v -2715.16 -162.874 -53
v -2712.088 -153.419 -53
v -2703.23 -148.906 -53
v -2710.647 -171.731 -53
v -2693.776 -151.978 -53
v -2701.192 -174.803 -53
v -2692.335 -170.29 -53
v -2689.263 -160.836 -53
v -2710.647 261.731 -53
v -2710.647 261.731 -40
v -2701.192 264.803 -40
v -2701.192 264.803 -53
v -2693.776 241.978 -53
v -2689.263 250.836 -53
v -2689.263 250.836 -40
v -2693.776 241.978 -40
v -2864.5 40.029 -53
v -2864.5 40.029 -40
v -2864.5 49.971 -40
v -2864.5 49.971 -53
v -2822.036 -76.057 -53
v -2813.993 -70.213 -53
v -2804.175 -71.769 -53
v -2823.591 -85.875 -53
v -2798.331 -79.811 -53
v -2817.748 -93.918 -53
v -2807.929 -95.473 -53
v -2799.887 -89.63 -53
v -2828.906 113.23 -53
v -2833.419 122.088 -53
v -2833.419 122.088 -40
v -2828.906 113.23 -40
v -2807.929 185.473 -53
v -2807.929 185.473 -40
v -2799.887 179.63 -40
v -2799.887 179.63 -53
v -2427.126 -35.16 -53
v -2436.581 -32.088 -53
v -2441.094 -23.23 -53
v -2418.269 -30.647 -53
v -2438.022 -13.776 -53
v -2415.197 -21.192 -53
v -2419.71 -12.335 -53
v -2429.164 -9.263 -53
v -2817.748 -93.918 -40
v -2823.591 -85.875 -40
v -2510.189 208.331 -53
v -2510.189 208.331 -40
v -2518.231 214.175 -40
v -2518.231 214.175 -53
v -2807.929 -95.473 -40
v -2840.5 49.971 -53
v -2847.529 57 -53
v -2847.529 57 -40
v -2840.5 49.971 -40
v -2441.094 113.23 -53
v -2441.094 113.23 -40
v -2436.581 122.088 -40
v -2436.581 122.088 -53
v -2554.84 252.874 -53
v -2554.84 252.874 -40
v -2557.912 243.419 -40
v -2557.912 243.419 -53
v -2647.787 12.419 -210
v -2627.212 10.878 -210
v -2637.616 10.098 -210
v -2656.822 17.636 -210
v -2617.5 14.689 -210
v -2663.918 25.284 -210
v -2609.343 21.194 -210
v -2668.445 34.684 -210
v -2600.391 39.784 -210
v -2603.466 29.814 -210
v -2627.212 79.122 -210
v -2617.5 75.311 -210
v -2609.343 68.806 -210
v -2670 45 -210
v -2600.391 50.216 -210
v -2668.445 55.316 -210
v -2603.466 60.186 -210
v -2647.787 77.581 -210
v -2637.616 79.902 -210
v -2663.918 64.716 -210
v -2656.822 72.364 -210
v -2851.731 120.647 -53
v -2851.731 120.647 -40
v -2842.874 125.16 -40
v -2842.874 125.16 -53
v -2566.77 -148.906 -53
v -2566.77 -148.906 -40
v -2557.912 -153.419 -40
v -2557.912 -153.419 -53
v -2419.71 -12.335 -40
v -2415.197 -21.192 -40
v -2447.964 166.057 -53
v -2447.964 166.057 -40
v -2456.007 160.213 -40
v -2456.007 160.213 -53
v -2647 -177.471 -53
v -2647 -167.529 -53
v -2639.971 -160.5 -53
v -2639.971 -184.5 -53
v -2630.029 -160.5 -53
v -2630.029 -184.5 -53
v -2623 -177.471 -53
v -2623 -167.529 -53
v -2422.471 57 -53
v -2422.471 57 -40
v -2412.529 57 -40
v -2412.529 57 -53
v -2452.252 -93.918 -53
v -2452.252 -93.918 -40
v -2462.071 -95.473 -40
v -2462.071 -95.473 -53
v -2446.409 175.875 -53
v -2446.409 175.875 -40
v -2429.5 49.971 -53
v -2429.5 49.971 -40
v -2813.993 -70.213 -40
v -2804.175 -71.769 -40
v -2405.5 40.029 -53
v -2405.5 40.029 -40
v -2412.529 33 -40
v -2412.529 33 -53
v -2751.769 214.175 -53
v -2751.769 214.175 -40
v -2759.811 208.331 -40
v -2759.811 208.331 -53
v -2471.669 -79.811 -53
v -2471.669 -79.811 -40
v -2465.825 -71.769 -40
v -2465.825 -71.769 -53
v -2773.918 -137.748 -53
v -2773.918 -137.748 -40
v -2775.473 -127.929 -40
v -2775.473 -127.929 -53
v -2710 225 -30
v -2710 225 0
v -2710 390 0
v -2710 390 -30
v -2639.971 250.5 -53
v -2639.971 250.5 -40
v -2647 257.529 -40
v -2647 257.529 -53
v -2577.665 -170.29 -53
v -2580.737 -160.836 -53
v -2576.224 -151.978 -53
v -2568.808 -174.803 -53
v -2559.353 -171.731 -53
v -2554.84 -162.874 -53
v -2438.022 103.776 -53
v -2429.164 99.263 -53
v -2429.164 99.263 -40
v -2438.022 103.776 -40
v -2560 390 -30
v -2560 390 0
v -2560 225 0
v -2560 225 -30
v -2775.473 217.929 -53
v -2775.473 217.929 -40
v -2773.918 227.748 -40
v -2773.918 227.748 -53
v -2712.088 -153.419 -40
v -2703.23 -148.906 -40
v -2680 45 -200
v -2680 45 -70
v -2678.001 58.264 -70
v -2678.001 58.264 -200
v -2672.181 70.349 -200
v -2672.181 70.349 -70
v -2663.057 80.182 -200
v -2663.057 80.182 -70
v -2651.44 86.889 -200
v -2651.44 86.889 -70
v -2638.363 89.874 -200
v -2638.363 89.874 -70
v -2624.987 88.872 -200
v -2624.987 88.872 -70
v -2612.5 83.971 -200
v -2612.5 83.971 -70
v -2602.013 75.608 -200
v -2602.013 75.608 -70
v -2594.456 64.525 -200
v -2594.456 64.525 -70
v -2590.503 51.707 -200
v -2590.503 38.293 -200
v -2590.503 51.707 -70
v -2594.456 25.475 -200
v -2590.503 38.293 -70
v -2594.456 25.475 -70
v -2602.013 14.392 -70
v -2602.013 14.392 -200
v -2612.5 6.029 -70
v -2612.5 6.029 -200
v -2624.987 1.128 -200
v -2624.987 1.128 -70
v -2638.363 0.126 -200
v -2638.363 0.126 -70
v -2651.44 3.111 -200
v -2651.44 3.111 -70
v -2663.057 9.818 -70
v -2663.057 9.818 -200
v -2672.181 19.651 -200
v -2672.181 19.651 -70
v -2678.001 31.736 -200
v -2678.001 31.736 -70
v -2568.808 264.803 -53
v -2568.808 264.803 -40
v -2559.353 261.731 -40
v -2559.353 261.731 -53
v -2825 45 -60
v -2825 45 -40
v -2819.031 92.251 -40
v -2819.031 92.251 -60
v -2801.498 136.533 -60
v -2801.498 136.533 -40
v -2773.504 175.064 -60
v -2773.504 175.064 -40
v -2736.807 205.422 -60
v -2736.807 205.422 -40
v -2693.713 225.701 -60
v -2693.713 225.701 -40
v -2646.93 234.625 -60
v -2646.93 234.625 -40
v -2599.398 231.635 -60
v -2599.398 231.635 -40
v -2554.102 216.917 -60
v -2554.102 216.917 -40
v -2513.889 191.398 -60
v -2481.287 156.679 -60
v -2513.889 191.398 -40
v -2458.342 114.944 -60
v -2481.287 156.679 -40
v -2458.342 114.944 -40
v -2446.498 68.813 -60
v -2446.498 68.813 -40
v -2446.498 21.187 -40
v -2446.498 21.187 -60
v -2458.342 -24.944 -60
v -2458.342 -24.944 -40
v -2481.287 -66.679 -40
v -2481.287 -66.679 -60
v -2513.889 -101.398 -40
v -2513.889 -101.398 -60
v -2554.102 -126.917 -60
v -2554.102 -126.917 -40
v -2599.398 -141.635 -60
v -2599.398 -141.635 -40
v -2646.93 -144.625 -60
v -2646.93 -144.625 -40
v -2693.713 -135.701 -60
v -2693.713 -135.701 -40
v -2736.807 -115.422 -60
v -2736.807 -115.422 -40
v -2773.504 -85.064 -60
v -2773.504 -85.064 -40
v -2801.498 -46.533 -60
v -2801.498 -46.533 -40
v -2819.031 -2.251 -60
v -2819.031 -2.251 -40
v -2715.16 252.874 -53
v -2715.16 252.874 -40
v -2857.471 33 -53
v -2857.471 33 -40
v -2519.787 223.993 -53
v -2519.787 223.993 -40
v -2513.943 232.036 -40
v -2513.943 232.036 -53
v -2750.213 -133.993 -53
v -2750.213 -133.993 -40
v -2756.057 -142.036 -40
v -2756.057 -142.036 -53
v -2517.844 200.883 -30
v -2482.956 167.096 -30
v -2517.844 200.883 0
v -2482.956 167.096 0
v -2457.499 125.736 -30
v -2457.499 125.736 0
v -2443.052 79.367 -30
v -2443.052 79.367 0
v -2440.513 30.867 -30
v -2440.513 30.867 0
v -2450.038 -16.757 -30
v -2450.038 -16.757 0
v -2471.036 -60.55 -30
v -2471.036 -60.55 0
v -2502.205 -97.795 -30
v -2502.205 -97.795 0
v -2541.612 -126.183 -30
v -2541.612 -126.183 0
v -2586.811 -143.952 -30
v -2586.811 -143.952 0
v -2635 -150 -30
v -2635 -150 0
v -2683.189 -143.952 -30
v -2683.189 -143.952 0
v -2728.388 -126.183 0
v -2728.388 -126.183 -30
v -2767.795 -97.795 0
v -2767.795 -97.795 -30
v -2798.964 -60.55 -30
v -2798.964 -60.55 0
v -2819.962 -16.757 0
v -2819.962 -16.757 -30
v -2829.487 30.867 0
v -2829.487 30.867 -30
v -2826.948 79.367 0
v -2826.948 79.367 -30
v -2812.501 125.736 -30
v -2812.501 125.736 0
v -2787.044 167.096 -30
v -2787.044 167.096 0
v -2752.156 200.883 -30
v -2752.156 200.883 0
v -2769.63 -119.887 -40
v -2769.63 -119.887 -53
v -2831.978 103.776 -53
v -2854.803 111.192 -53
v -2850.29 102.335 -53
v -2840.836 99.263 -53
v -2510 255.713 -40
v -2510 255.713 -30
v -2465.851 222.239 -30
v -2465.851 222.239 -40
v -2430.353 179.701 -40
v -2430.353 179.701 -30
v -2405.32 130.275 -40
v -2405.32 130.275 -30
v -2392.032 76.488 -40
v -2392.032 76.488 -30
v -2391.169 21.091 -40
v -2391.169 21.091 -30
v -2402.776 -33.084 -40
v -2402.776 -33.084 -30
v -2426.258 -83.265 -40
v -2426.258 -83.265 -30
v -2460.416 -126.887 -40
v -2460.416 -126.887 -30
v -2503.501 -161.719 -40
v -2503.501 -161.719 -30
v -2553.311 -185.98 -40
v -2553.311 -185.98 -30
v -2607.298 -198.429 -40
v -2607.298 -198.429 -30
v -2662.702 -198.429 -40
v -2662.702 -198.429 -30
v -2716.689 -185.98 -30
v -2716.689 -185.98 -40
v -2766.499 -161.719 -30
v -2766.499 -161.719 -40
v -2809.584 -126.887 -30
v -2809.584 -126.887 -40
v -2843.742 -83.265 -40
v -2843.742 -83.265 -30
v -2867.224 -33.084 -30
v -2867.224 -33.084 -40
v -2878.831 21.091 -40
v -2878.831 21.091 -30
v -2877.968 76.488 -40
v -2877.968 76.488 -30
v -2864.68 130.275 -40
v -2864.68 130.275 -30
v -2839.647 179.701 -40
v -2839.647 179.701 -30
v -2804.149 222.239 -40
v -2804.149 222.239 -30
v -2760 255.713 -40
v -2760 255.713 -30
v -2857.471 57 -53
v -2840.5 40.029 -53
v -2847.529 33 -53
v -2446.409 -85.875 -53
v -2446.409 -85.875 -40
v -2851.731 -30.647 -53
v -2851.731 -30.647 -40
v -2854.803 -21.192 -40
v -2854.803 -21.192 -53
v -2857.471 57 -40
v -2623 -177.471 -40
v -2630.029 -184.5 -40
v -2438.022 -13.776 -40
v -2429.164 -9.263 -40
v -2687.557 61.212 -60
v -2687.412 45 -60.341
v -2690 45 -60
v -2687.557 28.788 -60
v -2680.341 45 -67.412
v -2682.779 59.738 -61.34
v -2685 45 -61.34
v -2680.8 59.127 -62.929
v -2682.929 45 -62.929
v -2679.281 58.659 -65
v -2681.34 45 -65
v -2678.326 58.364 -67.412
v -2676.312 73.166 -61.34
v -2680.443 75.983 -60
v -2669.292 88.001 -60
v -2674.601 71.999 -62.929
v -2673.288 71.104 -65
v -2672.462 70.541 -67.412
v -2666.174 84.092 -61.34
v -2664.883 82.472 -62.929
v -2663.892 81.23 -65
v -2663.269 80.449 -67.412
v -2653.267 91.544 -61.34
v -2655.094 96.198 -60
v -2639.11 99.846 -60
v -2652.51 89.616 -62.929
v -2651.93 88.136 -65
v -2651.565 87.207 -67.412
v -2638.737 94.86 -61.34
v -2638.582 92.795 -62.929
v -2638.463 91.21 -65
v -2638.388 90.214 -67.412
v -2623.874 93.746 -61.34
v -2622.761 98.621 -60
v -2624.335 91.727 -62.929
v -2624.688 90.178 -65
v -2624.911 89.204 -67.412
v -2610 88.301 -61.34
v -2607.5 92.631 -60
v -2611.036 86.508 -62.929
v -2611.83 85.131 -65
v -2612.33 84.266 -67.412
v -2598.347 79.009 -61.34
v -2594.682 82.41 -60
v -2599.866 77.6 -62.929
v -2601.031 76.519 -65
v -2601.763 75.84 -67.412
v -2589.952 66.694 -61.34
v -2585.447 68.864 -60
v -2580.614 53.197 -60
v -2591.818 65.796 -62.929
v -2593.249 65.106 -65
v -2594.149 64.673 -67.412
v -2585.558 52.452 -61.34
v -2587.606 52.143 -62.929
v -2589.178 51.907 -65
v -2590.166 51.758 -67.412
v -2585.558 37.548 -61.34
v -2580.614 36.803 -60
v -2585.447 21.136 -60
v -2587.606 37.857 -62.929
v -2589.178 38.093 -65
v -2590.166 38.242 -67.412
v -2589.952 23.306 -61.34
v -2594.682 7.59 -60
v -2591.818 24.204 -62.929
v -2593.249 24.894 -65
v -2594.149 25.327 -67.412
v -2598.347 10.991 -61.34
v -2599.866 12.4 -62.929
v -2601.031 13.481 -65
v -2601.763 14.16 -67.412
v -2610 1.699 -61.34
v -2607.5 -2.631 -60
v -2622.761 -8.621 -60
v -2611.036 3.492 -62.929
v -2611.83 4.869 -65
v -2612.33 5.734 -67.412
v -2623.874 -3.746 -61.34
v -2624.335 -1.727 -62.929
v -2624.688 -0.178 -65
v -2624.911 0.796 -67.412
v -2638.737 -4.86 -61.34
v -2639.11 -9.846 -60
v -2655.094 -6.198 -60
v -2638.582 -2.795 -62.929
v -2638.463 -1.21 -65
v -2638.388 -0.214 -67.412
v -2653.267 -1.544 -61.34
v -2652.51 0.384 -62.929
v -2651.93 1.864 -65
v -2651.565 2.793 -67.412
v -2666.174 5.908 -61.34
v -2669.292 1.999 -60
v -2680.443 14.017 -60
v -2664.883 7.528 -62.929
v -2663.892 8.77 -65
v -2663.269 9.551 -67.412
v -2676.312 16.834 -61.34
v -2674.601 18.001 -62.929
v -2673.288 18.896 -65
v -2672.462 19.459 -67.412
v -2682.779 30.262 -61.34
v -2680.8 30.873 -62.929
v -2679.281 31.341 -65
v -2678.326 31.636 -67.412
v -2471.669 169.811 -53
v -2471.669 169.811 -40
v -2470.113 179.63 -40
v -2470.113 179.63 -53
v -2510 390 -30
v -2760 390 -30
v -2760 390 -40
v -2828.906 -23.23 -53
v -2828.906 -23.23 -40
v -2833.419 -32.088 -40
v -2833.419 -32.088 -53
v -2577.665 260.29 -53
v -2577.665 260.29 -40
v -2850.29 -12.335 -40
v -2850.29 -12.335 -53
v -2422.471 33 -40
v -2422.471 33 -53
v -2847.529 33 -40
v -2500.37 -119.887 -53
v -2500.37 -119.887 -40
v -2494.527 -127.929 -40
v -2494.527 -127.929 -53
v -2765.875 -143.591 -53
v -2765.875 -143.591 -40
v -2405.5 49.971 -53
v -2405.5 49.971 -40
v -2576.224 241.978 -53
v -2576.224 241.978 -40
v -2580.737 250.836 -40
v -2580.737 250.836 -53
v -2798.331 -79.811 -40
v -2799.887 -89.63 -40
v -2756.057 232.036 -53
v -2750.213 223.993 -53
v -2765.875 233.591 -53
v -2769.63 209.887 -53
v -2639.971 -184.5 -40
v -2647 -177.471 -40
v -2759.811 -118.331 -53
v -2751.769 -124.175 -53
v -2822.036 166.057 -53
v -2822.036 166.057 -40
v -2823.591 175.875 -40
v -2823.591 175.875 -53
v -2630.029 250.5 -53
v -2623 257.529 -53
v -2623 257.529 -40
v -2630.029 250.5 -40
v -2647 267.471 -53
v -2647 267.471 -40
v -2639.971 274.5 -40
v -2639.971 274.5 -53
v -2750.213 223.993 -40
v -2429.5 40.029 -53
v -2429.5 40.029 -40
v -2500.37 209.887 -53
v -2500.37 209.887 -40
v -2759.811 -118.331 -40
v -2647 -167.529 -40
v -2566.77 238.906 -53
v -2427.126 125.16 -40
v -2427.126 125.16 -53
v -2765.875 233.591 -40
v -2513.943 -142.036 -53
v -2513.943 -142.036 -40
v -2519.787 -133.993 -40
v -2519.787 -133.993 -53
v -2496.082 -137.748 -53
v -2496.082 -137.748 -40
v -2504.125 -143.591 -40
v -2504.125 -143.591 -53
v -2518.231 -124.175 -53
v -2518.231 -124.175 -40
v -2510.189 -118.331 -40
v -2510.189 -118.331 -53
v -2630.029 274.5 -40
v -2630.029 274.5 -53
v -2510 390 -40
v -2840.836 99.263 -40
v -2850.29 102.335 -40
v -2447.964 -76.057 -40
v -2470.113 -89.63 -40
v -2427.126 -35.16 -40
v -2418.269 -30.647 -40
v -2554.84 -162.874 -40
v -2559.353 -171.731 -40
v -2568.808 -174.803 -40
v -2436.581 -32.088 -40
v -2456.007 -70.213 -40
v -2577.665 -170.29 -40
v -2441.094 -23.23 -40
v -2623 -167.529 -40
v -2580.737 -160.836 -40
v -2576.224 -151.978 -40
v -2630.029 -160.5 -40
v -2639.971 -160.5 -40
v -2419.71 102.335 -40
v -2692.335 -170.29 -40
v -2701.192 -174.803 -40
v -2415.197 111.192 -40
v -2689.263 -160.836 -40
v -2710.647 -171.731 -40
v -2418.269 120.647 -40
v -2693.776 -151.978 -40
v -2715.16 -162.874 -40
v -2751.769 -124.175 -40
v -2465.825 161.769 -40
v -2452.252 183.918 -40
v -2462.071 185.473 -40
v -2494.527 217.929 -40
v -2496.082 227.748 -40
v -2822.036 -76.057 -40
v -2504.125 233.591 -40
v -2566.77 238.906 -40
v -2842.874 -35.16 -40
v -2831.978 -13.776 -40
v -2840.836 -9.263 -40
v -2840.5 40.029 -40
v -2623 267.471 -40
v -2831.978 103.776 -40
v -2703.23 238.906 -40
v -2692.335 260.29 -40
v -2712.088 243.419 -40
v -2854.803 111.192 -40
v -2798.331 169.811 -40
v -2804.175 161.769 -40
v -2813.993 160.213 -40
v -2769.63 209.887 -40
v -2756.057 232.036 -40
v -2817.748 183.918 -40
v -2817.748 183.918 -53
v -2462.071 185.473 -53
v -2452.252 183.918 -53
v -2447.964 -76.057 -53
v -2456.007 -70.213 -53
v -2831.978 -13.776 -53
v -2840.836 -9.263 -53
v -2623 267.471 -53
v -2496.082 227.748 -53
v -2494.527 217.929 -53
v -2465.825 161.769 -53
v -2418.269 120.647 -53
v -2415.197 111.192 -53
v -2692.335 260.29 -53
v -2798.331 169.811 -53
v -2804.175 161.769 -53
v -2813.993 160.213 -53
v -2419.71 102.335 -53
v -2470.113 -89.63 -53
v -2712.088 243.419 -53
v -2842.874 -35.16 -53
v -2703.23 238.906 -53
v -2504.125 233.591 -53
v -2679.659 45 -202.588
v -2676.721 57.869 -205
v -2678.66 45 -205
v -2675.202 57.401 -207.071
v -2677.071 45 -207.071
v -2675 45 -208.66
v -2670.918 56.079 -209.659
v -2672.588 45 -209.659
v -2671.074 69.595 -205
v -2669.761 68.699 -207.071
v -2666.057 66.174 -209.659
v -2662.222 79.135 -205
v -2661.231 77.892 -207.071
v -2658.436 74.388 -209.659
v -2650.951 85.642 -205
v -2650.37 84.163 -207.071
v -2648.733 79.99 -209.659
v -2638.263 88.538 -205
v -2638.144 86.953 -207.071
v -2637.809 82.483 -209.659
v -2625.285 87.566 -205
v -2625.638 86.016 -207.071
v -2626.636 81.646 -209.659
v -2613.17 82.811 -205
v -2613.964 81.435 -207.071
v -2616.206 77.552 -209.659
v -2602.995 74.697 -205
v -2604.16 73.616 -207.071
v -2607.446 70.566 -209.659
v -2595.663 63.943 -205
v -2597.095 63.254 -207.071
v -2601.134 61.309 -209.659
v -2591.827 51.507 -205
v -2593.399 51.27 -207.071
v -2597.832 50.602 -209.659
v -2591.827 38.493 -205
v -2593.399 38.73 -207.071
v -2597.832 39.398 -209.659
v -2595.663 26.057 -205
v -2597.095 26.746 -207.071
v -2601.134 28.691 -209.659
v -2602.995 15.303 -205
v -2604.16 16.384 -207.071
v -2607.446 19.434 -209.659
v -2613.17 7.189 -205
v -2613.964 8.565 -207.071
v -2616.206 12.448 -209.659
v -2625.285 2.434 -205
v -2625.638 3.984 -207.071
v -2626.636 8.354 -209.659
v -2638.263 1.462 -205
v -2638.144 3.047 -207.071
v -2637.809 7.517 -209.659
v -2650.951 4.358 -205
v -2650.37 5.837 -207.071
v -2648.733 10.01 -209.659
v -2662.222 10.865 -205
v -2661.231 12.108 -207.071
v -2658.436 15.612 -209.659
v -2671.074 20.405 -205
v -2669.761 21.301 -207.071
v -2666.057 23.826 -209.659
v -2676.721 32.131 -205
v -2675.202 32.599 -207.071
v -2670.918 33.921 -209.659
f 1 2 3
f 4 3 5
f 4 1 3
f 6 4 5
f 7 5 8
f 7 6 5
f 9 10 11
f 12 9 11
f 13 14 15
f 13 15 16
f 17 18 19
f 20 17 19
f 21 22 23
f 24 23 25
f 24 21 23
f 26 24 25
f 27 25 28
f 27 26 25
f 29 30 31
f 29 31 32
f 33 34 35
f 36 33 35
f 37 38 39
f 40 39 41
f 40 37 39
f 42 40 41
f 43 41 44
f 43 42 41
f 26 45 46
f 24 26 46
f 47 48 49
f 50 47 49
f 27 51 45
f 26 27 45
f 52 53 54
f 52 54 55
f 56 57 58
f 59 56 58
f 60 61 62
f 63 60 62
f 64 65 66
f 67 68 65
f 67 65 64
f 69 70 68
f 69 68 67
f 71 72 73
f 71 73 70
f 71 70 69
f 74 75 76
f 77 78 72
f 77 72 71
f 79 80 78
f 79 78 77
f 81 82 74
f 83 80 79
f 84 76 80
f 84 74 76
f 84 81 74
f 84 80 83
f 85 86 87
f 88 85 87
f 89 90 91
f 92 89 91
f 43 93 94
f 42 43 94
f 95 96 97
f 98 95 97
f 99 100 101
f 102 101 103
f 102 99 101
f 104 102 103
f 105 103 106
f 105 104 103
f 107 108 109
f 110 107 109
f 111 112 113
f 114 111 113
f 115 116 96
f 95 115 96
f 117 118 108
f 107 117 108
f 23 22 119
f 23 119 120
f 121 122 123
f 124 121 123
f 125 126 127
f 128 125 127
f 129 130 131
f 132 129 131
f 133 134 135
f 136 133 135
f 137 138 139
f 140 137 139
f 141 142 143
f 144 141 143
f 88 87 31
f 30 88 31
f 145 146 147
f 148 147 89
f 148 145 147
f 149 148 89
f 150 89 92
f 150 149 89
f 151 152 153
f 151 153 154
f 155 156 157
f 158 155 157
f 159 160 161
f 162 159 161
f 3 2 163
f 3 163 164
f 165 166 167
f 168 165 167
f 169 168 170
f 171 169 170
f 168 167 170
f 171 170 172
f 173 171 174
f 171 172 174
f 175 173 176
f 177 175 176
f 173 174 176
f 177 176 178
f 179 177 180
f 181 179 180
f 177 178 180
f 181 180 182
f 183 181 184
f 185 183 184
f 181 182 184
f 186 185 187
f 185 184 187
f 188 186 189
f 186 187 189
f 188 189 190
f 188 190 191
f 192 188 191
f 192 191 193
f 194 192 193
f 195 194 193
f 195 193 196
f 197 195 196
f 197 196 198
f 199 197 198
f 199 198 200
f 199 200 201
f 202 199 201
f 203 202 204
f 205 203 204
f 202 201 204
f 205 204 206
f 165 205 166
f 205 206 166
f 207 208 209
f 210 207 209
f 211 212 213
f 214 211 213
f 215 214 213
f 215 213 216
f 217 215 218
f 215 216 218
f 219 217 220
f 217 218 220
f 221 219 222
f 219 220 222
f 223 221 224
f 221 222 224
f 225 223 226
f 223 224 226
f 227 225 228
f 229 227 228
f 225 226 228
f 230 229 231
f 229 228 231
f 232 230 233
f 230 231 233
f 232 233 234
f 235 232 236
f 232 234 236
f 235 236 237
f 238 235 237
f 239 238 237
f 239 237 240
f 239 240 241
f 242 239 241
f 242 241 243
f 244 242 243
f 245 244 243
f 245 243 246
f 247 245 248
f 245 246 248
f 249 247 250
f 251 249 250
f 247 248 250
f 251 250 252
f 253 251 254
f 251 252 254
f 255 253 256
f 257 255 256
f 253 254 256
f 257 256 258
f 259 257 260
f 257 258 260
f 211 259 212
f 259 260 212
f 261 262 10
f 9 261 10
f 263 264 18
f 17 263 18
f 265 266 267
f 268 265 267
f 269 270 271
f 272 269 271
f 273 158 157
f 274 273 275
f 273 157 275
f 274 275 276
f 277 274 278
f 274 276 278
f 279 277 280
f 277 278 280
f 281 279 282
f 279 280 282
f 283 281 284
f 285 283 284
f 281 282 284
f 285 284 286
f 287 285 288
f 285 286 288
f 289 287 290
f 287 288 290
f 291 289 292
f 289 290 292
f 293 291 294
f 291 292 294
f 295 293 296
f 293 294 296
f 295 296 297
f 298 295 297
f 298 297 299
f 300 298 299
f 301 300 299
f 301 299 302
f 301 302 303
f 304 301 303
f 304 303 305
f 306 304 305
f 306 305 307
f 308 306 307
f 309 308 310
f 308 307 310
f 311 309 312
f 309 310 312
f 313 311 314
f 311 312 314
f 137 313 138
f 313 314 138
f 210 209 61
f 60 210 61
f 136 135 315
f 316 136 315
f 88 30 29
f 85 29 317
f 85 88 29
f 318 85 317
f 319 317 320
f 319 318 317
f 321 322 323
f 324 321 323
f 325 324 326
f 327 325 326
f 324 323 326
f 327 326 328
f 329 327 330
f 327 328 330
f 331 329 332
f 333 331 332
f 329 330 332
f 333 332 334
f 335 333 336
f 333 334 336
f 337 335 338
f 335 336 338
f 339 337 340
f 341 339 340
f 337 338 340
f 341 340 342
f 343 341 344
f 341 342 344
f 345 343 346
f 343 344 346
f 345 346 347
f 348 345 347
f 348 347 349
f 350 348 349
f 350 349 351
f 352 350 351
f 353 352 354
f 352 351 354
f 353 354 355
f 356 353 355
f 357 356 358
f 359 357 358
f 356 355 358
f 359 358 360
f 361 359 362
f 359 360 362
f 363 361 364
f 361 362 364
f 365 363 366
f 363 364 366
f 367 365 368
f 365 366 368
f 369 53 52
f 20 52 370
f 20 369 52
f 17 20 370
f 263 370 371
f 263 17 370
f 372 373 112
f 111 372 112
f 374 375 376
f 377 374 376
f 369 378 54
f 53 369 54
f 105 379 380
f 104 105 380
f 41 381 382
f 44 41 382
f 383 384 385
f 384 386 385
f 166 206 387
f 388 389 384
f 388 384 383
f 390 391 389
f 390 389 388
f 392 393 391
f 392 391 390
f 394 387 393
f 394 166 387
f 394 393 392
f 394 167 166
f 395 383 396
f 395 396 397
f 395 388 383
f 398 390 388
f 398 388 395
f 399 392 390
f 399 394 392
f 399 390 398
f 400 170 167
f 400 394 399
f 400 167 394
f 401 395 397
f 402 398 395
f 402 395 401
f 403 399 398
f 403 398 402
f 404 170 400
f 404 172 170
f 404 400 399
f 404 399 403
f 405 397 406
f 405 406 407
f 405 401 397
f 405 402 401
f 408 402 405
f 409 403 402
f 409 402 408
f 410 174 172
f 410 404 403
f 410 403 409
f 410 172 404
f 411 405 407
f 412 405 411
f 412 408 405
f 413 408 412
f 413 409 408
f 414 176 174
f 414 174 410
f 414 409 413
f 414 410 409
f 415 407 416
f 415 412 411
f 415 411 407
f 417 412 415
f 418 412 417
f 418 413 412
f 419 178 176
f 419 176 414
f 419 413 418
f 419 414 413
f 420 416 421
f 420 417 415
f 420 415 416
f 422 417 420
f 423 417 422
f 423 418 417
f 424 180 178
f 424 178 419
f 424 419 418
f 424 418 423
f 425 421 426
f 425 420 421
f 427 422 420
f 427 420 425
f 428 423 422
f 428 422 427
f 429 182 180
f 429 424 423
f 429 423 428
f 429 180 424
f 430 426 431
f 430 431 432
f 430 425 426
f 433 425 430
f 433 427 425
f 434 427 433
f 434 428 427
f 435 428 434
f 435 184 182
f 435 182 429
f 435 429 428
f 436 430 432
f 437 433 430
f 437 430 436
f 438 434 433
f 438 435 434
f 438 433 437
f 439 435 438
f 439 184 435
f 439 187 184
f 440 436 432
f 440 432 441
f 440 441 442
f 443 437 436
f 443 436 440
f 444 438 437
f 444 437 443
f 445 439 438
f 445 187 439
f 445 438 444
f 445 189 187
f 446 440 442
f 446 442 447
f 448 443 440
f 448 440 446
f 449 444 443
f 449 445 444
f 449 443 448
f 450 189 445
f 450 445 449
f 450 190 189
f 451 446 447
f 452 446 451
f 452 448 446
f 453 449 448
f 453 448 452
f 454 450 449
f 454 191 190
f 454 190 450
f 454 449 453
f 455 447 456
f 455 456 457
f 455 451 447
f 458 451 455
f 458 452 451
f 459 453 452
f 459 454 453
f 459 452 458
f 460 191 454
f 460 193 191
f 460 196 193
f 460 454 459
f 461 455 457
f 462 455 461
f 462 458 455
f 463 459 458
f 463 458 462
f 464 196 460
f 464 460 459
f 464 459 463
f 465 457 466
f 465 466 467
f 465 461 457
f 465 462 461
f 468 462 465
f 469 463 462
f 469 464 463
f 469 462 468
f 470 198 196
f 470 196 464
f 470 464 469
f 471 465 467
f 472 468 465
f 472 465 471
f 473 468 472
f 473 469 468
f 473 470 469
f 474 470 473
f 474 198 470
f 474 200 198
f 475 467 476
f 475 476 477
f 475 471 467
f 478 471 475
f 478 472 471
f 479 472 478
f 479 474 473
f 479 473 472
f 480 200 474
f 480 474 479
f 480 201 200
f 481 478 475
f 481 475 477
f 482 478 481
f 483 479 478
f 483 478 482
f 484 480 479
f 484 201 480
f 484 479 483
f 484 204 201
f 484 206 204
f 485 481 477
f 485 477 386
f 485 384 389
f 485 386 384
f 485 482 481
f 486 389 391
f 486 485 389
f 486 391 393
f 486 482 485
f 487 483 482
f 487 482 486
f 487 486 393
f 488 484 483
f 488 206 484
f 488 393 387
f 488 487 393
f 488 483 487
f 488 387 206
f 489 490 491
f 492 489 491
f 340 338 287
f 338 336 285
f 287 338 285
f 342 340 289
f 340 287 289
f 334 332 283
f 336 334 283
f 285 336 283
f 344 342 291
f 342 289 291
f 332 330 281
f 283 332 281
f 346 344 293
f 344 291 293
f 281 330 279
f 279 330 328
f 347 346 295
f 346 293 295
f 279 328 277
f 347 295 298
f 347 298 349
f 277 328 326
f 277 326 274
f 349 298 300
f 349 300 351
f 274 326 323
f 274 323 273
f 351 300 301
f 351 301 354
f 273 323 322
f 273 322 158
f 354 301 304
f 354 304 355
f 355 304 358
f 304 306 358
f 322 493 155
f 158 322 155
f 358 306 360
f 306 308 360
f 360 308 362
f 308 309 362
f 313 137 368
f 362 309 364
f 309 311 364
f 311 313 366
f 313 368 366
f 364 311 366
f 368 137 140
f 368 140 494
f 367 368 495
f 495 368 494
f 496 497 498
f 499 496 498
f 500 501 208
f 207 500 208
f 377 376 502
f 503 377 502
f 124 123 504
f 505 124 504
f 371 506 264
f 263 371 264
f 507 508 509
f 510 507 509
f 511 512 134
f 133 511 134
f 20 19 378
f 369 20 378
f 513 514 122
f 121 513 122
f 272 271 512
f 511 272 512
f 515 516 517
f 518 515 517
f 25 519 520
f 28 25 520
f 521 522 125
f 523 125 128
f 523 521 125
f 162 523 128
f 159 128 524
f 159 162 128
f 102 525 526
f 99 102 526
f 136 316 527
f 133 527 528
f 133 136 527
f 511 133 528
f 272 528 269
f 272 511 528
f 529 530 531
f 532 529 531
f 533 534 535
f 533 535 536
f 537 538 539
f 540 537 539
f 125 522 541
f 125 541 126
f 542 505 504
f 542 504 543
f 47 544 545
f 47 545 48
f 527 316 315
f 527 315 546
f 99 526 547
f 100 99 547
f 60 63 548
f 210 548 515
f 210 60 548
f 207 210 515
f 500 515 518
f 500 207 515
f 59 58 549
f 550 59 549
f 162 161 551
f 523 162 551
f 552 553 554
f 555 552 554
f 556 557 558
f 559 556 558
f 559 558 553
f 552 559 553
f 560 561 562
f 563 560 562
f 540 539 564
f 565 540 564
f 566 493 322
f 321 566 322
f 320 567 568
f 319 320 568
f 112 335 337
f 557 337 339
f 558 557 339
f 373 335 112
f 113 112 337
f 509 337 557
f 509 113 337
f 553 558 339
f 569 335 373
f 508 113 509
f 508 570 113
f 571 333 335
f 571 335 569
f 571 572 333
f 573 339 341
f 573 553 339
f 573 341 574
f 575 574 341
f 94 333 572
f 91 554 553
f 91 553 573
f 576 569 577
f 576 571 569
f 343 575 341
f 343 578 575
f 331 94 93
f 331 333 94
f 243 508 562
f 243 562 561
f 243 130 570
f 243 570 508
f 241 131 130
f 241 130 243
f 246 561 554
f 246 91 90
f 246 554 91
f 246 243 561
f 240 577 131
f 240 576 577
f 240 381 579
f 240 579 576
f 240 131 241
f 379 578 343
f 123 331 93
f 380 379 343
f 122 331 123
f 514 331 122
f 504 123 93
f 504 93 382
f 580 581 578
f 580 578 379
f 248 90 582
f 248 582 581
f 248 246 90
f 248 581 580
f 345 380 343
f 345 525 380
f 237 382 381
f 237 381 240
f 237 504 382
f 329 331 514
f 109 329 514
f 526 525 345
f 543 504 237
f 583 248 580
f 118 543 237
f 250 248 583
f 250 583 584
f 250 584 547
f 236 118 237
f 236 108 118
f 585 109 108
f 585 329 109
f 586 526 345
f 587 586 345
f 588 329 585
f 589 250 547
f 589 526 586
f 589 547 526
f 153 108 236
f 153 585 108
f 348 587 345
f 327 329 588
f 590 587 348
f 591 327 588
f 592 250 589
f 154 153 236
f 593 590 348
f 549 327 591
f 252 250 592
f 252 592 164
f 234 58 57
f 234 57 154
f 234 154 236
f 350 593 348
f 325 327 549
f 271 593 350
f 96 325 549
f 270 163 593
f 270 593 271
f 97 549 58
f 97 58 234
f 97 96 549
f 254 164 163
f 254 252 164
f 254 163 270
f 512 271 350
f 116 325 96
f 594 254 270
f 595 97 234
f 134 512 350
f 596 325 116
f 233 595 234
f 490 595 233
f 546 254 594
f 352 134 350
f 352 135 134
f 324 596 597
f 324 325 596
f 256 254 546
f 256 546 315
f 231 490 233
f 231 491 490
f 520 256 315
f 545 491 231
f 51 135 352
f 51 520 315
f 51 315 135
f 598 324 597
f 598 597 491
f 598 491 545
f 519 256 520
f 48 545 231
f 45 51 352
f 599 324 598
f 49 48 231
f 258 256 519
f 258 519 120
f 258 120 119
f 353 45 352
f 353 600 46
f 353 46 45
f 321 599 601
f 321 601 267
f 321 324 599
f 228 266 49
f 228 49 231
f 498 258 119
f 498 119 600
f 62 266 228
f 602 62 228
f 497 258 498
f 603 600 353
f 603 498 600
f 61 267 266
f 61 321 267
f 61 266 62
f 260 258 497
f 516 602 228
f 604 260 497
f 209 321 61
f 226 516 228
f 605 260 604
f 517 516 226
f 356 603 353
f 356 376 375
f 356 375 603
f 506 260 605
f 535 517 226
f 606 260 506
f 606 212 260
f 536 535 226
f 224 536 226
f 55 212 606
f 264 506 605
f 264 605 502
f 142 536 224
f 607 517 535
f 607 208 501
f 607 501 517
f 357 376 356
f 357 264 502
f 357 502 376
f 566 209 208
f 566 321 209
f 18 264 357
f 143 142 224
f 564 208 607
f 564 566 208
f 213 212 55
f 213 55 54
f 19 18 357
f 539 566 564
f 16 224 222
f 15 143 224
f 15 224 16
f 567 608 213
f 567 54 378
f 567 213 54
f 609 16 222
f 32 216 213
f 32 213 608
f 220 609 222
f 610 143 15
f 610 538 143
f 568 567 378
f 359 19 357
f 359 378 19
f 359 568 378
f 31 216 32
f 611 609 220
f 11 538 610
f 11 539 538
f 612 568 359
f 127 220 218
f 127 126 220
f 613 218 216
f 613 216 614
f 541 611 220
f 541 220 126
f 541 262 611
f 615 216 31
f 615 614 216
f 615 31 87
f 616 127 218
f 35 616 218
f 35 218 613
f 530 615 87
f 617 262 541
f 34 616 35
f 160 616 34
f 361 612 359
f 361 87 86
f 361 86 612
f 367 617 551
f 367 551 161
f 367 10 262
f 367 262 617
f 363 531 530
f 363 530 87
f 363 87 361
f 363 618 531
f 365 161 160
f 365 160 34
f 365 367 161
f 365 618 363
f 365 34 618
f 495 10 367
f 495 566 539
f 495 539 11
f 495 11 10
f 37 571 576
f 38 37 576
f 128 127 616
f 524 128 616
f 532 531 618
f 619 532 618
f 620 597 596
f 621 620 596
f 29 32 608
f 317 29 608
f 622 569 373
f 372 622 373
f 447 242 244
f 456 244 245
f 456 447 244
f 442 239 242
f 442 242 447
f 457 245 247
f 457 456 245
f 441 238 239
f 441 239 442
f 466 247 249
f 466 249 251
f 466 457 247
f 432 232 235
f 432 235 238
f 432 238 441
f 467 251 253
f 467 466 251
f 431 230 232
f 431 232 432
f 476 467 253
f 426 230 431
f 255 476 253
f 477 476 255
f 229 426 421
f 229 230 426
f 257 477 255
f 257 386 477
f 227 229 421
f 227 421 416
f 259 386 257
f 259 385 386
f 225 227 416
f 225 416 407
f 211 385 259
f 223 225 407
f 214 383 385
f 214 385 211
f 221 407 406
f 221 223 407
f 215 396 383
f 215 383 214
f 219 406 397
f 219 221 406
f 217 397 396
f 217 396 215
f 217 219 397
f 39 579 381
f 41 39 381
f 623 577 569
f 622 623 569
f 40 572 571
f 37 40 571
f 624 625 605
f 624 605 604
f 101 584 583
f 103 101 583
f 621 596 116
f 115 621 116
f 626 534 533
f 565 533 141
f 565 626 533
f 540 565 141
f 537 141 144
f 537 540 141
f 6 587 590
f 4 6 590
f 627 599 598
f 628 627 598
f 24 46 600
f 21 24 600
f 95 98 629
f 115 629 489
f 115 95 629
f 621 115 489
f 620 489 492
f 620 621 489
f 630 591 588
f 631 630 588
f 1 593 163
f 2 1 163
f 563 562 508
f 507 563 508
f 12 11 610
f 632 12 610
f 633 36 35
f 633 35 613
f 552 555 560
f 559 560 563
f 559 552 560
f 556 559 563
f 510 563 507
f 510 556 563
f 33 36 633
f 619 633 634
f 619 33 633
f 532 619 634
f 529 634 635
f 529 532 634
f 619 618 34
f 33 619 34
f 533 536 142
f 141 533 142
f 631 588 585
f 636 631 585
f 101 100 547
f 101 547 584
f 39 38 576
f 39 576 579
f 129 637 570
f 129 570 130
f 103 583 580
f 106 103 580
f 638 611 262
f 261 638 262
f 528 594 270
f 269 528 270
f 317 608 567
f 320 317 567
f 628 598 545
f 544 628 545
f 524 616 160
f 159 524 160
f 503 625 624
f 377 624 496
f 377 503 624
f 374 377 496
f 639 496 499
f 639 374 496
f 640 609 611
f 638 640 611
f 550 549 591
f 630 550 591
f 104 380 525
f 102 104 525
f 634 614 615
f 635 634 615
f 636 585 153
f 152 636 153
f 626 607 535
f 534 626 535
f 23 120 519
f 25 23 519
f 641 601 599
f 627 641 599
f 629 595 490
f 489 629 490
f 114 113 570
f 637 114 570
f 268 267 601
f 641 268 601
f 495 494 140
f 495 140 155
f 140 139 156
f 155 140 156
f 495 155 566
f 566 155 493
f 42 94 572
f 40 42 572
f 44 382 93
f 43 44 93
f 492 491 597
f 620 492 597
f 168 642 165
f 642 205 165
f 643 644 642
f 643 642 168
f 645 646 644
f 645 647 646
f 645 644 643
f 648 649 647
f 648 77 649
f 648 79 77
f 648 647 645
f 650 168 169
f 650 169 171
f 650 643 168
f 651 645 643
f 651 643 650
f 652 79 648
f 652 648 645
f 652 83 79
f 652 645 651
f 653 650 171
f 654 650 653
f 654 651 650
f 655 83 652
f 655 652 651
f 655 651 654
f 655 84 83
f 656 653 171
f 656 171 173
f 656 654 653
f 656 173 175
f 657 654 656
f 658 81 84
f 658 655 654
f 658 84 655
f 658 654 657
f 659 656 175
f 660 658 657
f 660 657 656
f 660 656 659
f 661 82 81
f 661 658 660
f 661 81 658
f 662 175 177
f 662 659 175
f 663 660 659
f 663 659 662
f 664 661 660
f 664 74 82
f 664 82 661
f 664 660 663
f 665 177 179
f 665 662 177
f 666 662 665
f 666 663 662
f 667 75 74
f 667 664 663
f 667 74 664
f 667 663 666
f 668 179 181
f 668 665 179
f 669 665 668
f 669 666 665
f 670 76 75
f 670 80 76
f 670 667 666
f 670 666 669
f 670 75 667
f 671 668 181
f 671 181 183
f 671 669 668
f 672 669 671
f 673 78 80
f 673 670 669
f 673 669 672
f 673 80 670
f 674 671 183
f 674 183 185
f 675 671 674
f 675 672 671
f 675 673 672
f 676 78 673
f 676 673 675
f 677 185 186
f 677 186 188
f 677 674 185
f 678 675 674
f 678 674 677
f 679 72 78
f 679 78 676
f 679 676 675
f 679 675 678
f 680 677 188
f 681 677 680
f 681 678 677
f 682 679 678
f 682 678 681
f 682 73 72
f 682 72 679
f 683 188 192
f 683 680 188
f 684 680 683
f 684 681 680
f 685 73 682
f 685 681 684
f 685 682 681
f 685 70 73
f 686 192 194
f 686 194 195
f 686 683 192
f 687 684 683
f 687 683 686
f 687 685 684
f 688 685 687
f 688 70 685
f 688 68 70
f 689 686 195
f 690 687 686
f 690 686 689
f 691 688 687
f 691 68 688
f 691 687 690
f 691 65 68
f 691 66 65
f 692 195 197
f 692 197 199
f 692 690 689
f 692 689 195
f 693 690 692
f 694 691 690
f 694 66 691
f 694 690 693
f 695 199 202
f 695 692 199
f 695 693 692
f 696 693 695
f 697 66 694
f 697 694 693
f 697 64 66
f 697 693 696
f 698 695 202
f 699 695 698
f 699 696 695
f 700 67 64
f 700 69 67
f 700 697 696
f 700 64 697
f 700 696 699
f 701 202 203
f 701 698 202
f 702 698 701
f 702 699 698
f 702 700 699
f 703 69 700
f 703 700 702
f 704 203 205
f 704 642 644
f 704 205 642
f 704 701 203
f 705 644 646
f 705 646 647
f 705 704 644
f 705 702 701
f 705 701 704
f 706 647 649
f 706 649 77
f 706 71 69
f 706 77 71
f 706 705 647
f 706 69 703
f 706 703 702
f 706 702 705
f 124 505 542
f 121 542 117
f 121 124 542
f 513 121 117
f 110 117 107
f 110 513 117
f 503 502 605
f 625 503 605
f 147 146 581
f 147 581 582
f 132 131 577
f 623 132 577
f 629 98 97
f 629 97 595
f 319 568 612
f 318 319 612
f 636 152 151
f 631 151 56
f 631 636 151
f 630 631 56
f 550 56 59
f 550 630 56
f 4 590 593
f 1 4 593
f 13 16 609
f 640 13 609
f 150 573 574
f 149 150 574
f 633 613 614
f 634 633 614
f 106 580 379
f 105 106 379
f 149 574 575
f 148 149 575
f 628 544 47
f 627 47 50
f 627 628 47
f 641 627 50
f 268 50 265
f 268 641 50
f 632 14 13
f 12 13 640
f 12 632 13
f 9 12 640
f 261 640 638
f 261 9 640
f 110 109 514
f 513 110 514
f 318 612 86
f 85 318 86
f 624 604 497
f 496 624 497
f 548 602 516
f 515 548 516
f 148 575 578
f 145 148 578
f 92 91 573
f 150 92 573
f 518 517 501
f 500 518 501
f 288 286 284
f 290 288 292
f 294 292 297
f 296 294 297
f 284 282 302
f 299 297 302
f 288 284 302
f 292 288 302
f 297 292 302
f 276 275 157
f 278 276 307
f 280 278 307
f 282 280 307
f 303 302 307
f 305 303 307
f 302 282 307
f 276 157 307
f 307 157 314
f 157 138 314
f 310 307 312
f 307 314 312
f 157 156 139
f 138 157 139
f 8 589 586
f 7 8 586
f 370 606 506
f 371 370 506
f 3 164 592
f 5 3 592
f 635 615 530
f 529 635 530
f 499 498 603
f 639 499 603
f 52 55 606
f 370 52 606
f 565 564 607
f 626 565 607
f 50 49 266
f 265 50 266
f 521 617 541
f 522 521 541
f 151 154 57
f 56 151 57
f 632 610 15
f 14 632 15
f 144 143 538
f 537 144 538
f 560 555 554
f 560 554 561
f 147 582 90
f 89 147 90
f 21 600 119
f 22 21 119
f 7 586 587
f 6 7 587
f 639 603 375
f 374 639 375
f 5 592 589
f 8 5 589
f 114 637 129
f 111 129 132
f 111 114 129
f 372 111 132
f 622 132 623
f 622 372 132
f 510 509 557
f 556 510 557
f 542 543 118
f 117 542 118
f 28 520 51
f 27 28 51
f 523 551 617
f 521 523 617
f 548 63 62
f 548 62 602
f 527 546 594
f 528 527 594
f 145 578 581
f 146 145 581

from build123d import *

# Parameters (mm, degrees)
Y_KSEKLIK_EKSTR_ZYON1_DEPTH = 30
Y_KSEKLIK_EKSTR_ZYON2_DEPTH = 10
IZIM5_R                     = 190
Y_KSEKLIK_EKSTR_ZYON3_DEPTH = 20
Y_KSEKLIK_EKSTR_ZYON4_DEPTH = 13
DAIRESEL_KAPLAMA1_COUNT     = 20
IZIM7_R                     = 45
Y_KSEKLIK_EKSTR_ZYON5_DEPTH = 150
RADYUS1_R                   = 10


with BuildPart() as part:
    # Çizim1 → Yükseklik-Ekstrüzyon1 (new body)
    with BuildSketch(Plane.XY):
        with BuildLine():
            Line((-2560, 390), (-2560, 225))
            ThreePointArc((-2560, 225), (-2635, -150), (-2710, 225))
            Line((-2710, 225), (-2710, 390))
            Line((-2710, 390), (-2560, 390))
        make_face()
    extrude(amount=-Y_KSEKLIK_EKSTR_ZYON1_DEPTH)

    # Çizim4 → Yükseklik-Ekstrüzyon2 (add)
    with BuildSketch(Plane(origin=(0, 0, -30), x_dir=(-1, 0, 0), z_dir=(0, 0, -1))):
        with BuildLine():
            Line((2510, 390), (2510, 255.713075057))
            ThreePointArc((2510, 255.713075057), (2635, -200), (2760, 255.713075057))
            Line((2760, 255.713075057), (2760, 390))
            Line((2760, 390), (2510, 390))
        make_face()
    extrude(amount=Y_KSEKLIK_EKSTR_ZYON2_DEPTH)

    # Çizim5 → Yükseklik-Ekstrüzyon3 (add)
    with BuildSketch(Plane(origin=(0, 0, -40), x_dir=(-1, 0, 0), z_dir=(0, 0, -1))):
        with Locations((2635, 45)):
            Circle(IZIM5_R)
    extrude(amount=Y_KSEKLIK_EKSTR_ZYON3_DEPTH)

    # Çizim6 → Yükseklik-Ekstrüzyon4 (add)
    with BuildSketch(Plane(origin=(0, 0, -40), x_dir=(-1, 0, 0), z_dir=(0, 0, -1))):
        Polygon((2639.970562748, 250.5), (2647, 257.529437252), (2647, 267.470562748), (2639.970562748, 274.5), (2630.029437252, 274.5), (2623, 267.470562748), (2623, 257.529437252), (2630.029437252, 250.5), align=None)
    y_kseklik_ekstr_zyon4 = extrude(amount=Y_KSEKLIK_EKSTR_ZYON4_DEPTH)

    # Dairesel Kaplama1: Yükseklik-Ekstrüzyon4 ×20 about axis
    dairesel_kaplama1_axis = Axis((-2635, 45, 0), (0, 0, 1))
    for i in range(1, DAIRESEL_KAPLAMA1_COUNT):
        add(y_kseklik_ekstr_zyon4.rotate(dairesel_kaplama1_axis, i * 360 / DAIRESEL_KAPLAMA1_COUNT))

    # Çizim7 → Yükseklik-Ekstrüzyon5 (add)
    with BuildSketch(Plane(origin=(0, 0, -60), x_dir=(-1, 0, 0), z_dir=(0, 0, -1))):
        with Locations((2635, 45)):
            Circle(IZIM7_R)
    extrude(amount=Y_KSEKLIK_EKSTR_ZYON5_DEPTH)

    # Radyus1
    radyus1_edges = [part.edges().sort_by_distance(p)[0] for p in [
        (-2590, 45, -60),
        (-2590, 45, -210),
    ]]
    fillet(radyus1_edges, radius=RADYUS1_R)


solid = part.part
